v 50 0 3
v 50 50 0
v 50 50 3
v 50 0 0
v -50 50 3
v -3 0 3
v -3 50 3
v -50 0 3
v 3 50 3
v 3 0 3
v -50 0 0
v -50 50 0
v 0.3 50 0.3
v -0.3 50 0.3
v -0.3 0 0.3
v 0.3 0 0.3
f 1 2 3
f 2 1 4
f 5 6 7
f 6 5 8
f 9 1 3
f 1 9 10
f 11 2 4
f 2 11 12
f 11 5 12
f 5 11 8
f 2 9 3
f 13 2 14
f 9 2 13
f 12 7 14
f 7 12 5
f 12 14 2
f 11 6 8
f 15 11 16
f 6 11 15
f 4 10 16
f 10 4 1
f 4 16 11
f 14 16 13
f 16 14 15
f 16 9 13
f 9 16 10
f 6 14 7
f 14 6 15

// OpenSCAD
wall_thickness = 3;

part_size = [100,50];

first_layer = .3;

difference() {
    translate([-part_size.x/2,0,0])
    cube([part_size.x, part_size.y, wall_thickness]);

    translate([0,part_size.y,0])
    rotate([90,0,0])
    linear_extrude(height=part_size.y)
    polygon([
        [-first_layer,first_layer],
        [first_layer,first_layer],
        [wall_thickness, wall_thickness],
        [-wall_thickness, wall_thickness]
    ]);
}
